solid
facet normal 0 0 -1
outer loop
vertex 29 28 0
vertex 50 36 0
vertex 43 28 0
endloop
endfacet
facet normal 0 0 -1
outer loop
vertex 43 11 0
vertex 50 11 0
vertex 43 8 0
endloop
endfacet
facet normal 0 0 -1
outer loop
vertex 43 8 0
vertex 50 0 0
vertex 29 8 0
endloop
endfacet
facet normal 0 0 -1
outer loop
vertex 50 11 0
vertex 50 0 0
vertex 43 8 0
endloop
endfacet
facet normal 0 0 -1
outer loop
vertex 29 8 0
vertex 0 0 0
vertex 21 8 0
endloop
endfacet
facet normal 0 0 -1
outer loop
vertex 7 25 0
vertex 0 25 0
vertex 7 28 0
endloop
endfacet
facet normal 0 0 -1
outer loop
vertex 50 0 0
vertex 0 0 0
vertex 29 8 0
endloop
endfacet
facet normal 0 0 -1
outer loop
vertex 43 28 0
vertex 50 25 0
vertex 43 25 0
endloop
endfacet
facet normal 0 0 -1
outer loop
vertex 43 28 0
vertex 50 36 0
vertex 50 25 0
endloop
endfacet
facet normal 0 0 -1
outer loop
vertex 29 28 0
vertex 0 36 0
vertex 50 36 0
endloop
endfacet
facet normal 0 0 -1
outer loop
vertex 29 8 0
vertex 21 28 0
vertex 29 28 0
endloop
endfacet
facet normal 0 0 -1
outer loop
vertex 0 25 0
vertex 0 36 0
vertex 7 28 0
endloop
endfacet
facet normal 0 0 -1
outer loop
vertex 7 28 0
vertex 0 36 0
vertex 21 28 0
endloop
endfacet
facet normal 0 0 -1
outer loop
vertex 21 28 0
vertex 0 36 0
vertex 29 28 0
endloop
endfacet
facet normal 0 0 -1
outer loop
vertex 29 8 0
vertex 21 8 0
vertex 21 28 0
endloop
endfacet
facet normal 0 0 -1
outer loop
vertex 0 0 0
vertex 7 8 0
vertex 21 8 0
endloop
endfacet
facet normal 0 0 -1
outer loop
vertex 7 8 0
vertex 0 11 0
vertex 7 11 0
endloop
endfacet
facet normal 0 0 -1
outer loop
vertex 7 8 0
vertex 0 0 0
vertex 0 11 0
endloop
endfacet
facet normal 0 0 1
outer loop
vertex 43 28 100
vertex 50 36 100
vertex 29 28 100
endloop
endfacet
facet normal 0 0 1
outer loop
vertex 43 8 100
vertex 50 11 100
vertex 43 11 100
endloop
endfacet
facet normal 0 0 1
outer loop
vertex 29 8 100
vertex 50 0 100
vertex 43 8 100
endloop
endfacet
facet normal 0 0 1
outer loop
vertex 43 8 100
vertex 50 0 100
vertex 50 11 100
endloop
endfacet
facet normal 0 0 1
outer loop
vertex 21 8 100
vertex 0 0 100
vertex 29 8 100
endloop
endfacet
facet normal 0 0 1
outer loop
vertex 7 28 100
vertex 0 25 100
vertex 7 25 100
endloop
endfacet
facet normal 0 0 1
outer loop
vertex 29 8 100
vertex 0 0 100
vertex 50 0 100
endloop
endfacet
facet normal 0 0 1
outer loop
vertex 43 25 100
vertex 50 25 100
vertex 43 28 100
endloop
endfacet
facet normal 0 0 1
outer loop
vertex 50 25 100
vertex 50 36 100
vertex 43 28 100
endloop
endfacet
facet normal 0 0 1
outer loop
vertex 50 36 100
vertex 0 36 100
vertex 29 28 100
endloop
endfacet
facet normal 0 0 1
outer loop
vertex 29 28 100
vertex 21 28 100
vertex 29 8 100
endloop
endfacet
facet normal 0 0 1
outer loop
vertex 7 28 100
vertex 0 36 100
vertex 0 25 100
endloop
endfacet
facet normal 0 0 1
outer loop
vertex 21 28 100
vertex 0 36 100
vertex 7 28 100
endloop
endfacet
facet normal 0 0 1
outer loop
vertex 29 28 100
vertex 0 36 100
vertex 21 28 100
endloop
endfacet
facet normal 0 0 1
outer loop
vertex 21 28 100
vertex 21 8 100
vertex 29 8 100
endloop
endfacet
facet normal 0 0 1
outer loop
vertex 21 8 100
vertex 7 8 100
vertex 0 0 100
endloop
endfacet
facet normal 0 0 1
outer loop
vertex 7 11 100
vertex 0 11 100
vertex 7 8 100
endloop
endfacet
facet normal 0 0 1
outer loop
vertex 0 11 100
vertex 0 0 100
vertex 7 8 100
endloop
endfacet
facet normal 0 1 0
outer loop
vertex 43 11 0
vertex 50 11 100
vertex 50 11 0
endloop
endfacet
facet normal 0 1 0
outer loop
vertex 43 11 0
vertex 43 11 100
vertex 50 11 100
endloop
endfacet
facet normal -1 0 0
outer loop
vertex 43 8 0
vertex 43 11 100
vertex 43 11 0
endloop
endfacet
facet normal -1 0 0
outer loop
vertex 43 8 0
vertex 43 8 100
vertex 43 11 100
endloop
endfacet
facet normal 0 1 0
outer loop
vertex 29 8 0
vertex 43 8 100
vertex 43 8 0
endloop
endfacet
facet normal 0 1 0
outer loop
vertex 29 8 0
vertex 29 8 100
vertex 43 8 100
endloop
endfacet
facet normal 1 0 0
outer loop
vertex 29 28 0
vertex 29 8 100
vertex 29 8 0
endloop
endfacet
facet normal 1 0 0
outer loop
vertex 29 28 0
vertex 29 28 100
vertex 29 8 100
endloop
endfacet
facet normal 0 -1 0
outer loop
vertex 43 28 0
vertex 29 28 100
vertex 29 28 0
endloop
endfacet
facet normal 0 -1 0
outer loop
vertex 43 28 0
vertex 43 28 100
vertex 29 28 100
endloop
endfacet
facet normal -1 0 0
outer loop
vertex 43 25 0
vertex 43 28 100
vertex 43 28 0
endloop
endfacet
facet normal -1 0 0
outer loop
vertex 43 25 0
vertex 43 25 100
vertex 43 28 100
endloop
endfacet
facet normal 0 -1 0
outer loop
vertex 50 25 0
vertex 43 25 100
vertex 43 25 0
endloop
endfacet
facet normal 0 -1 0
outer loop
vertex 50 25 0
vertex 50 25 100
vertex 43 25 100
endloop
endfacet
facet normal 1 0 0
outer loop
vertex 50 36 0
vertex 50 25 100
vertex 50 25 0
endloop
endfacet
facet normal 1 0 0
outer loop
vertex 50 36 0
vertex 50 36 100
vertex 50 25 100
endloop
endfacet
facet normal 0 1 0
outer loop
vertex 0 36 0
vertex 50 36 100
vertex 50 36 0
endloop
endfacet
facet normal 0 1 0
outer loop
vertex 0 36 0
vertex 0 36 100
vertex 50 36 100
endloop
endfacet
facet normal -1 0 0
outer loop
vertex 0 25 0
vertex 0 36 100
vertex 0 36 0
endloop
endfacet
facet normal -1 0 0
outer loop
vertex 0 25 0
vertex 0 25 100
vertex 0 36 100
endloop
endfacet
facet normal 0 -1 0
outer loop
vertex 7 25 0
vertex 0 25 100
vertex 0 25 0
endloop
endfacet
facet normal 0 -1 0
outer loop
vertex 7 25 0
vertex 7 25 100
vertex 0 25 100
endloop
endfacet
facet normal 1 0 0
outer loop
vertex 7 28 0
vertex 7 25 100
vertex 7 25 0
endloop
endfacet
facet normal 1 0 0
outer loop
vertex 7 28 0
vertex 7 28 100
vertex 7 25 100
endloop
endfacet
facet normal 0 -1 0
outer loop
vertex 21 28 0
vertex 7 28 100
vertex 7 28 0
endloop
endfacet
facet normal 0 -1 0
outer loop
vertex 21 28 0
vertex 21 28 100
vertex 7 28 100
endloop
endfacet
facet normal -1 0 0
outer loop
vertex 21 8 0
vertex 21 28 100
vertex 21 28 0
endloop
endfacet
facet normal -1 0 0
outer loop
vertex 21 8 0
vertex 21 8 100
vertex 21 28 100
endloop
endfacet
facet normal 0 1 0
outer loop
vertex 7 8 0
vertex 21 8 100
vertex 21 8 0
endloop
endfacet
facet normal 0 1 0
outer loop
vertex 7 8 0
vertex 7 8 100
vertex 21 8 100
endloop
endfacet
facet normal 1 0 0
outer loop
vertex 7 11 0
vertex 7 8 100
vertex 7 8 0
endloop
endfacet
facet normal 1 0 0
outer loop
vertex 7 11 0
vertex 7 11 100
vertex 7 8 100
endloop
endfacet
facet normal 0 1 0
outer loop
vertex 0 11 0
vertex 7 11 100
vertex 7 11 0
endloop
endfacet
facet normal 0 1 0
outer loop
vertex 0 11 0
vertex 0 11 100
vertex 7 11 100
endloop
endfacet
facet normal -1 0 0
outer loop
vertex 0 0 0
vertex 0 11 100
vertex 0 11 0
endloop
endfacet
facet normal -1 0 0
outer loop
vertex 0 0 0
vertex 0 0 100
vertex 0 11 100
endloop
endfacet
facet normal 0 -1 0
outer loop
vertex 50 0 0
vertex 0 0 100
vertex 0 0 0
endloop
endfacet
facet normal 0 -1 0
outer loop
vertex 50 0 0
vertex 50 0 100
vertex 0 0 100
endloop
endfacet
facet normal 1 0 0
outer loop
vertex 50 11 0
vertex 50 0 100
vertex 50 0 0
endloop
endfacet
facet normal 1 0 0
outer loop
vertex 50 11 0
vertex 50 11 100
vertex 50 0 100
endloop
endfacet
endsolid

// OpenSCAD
$fn = 32;

// ----------------------------------------------------------------------
// T-slot rail: 50 x 36 mm section, 100 mm long
// ----------------------------------------------------------------------

// --- parameters (mm) ---
profile_height = 100;     // extrusion height
profile_points = 20;      // points of the closed outline

profile = [[0, 0], [50, 0], [50, 11], [43, 11], [43, 8], [29, 8], [29, 28], [43, 28], [43, 25], [50, 25], [50, 36], [0, 36], [0, 25], [7, 25], [7, 28], [21, 28], [21, 8], [7, 8], [7, 11], [0, 11]];  // single closed polygon, 20 points, counter clockwise

// --- the one profile operation ---
linear_extrude(height = profile_height) polygon(points = profile);
